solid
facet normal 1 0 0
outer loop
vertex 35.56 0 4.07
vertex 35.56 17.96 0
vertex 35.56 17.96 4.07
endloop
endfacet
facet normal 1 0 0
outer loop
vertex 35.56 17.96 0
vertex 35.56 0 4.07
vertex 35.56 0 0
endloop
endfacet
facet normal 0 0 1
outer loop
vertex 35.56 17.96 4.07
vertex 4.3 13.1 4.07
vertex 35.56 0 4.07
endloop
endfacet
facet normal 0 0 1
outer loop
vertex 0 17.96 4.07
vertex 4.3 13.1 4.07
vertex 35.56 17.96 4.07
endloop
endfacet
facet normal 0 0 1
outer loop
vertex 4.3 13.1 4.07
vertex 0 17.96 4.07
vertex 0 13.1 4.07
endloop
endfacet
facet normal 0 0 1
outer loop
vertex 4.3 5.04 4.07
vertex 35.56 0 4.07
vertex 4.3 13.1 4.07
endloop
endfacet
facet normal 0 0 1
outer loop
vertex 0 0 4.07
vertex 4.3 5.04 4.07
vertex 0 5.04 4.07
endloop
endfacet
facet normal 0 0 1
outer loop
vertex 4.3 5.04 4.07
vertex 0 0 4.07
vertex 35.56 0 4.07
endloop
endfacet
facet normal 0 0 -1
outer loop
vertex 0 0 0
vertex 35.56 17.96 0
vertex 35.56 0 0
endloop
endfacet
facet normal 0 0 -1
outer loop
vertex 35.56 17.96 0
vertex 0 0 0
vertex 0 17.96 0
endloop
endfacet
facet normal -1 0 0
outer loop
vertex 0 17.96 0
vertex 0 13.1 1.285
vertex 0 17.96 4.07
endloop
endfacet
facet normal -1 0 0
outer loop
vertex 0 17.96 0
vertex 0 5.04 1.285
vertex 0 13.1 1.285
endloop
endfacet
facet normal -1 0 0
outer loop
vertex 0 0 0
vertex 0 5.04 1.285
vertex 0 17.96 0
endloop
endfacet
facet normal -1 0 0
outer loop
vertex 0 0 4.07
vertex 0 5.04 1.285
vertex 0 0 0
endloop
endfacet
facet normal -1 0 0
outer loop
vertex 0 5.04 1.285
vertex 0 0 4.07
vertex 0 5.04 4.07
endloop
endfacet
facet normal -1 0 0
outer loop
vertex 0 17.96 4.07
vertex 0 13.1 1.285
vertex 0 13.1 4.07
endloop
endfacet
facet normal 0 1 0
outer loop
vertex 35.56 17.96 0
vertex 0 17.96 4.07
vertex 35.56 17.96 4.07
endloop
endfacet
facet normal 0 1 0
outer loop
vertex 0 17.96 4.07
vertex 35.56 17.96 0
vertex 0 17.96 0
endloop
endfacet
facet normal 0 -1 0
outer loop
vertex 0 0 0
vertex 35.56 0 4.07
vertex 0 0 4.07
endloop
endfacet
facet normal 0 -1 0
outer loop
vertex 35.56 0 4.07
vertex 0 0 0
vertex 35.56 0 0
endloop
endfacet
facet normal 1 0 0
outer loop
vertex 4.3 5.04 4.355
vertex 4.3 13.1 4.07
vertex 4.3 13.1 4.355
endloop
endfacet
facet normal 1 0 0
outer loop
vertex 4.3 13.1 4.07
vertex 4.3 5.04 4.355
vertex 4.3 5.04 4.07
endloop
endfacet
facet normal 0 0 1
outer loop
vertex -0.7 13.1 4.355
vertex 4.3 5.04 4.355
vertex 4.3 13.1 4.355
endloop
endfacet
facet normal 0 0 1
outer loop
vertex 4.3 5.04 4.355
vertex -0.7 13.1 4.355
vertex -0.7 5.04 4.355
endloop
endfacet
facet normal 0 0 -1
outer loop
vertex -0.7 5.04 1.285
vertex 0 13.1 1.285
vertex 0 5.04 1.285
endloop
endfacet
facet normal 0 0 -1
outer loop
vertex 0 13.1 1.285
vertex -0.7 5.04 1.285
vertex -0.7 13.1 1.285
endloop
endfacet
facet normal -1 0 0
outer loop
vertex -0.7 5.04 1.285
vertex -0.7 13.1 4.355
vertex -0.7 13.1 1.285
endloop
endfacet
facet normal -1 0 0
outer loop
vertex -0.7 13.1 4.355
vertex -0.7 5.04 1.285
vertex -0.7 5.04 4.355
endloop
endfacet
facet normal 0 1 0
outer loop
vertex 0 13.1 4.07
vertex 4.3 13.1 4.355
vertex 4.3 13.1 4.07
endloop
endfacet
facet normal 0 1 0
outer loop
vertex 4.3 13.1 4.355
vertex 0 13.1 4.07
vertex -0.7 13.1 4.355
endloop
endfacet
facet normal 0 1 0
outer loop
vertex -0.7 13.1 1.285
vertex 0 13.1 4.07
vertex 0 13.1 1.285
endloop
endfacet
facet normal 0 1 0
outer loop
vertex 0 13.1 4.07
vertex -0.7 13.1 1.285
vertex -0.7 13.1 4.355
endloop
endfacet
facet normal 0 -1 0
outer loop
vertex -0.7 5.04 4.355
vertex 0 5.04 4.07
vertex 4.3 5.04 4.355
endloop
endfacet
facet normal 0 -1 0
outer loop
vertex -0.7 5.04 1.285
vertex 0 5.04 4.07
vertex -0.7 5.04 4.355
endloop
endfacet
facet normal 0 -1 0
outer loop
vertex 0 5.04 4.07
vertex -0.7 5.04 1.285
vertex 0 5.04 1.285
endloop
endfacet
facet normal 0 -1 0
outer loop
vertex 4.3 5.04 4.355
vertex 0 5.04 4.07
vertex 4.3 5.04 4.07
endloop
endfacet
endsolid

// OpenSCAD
// Teensy LC
//
// Dimensions from:
// https://pjrc.com/teensy/dimensions.html
//


teensy_lc(pin_holes=true, microcontroller=true, bounding_box=true);

module teensy_lc(pin_holes=true, microcontroller=true, bounding_box=false){
//$fa=1;
//$fs=.7;
$fn=8;

spec_length=35.56;
spec_width=17.78; // +-0.6
board_thickness=1.57;
board_length = spec_length;
manufacturing_variance = 0.18; // change this per board?
board_width = spec_width + manufacturing_variance;
usb_height = 2.5;

pin_separation=2.54;
pin_offset=pin_separation / 2;

top_pin_line = board_width - pin_offset;
bottom_pin_line = top_pin_line - (6 * pin_separation);
center_line = top_pin_line - (pin_separation * 3);

center_of_first_pin_to_center_of_reset = 29.85;

if (bounding_box){
  cube([board_length, board_width, board_thickness + usb_height]);
} else {
  color("green")
  pcb(pin_holes=pin_holes);

  if (microcontroller) {
    color("black")
    // offset from right edge is an approximation
    translate([board_length - 12.5, center_line, board_thickness])
    microcontroller();
  }

  translate([pin_offset + center_of_first_pin_to_center_of_reset,
             center_line,
             board_thickness])
  reset_button();
}

color("silver")
usb_connector(bounding_box=bounding_box);



module usb_connector(bounding_box=false){
  usb_width = 7.5;
  usb_length = 5;

  usb_flap_width = 8.06;
  usb_flap_height = 3.07;
  usb_flap_length = 0.06;

  usb_overhang = 0.7;


  translate([-usb_overhang, center_line - (usb_width / 2), board_thickness]){
    if (bounding_box){
        translate([
          0,
          -(usb_flap_width - usb_width) / 2,
          -(usb_flap_height - usb_height) / 2,
          ])
      cube([usb_length, usb_flap_width, usb_flap_height]);
    } else {
      cube([usb_length, usb_width, usb_height]);

      translate([
        0,
        -(usb_flap_width - usb_width) / 2,
        -(usb_flap_height - usb_height) / 2,
        ])
      cube([usb_flap_length, usb_flap_width, usb_flap_height]);
        }
    }
}


module reset_button(){
  button_length=2.2;
  button_width=3;
  button_height=2.5;
  housing_height=1.8;
  
  button_radius = button_length / 2;
  inner_rectangle_height = button_width - button_length;
  
  color("white")
  translate([0, -inner_rectangle_height/2, 0])
  linear_extrude(height=button_height)
  hull() {
      translate([0, inner_rectangle_height,0]) 
      circle(button_radius);
      circle(button_radius);
  }
  
  housing_length=3.2; //undocumented
  housing_width=4.2;  //undocumented
  color("silver")
  translate([-housing_length/2, -housing_width/2,0])
  cube([housing_length, housing_width, housing_height]);
}

module pcb(pin_holes){
  linear_extrude(height=board_thickness)
  difference(){
    // Everything is specified relative to the top line (y=board_width).
    // As manufacturing_variance increases, everything moves up, adding
    // more empty board to the bottom.
    square([board_length, board_width]);
    if (pin_holes) {
    translate([pin_offset, top_pin_line])
      pin_series(14);
    translate([pin_offset, bottom_pin_line])
      pin_series(14);
    
    translate([pin_offset + pin_separation, top_pin_line - pin_separation])
    pin();

    translate([pin_offset + 3 * pin_separation, top_pin_line - pin_separation])
    pin_series(3);
    

    translate([(14 * pin_separation) - pin_offset, top_pin_line - pin_separation])
    rotate(a=270)
    pin_series(5);
    }
  }


  module pin(){
    circle(r=0.5);
  }

  module pin_series(count) {
    for(i=[0:1:count - 1]){
      translate([pin_separation * i,0])
      pin();
    }
  }
}

module microcontroller(){
  mc_side=7;
  mc_height=1;
  
  rotate(a=45)
  translate([-mc_side/2, -mc_side/2, 0])
  cube([mc_side, mc_side, mc_height]);
}

}
